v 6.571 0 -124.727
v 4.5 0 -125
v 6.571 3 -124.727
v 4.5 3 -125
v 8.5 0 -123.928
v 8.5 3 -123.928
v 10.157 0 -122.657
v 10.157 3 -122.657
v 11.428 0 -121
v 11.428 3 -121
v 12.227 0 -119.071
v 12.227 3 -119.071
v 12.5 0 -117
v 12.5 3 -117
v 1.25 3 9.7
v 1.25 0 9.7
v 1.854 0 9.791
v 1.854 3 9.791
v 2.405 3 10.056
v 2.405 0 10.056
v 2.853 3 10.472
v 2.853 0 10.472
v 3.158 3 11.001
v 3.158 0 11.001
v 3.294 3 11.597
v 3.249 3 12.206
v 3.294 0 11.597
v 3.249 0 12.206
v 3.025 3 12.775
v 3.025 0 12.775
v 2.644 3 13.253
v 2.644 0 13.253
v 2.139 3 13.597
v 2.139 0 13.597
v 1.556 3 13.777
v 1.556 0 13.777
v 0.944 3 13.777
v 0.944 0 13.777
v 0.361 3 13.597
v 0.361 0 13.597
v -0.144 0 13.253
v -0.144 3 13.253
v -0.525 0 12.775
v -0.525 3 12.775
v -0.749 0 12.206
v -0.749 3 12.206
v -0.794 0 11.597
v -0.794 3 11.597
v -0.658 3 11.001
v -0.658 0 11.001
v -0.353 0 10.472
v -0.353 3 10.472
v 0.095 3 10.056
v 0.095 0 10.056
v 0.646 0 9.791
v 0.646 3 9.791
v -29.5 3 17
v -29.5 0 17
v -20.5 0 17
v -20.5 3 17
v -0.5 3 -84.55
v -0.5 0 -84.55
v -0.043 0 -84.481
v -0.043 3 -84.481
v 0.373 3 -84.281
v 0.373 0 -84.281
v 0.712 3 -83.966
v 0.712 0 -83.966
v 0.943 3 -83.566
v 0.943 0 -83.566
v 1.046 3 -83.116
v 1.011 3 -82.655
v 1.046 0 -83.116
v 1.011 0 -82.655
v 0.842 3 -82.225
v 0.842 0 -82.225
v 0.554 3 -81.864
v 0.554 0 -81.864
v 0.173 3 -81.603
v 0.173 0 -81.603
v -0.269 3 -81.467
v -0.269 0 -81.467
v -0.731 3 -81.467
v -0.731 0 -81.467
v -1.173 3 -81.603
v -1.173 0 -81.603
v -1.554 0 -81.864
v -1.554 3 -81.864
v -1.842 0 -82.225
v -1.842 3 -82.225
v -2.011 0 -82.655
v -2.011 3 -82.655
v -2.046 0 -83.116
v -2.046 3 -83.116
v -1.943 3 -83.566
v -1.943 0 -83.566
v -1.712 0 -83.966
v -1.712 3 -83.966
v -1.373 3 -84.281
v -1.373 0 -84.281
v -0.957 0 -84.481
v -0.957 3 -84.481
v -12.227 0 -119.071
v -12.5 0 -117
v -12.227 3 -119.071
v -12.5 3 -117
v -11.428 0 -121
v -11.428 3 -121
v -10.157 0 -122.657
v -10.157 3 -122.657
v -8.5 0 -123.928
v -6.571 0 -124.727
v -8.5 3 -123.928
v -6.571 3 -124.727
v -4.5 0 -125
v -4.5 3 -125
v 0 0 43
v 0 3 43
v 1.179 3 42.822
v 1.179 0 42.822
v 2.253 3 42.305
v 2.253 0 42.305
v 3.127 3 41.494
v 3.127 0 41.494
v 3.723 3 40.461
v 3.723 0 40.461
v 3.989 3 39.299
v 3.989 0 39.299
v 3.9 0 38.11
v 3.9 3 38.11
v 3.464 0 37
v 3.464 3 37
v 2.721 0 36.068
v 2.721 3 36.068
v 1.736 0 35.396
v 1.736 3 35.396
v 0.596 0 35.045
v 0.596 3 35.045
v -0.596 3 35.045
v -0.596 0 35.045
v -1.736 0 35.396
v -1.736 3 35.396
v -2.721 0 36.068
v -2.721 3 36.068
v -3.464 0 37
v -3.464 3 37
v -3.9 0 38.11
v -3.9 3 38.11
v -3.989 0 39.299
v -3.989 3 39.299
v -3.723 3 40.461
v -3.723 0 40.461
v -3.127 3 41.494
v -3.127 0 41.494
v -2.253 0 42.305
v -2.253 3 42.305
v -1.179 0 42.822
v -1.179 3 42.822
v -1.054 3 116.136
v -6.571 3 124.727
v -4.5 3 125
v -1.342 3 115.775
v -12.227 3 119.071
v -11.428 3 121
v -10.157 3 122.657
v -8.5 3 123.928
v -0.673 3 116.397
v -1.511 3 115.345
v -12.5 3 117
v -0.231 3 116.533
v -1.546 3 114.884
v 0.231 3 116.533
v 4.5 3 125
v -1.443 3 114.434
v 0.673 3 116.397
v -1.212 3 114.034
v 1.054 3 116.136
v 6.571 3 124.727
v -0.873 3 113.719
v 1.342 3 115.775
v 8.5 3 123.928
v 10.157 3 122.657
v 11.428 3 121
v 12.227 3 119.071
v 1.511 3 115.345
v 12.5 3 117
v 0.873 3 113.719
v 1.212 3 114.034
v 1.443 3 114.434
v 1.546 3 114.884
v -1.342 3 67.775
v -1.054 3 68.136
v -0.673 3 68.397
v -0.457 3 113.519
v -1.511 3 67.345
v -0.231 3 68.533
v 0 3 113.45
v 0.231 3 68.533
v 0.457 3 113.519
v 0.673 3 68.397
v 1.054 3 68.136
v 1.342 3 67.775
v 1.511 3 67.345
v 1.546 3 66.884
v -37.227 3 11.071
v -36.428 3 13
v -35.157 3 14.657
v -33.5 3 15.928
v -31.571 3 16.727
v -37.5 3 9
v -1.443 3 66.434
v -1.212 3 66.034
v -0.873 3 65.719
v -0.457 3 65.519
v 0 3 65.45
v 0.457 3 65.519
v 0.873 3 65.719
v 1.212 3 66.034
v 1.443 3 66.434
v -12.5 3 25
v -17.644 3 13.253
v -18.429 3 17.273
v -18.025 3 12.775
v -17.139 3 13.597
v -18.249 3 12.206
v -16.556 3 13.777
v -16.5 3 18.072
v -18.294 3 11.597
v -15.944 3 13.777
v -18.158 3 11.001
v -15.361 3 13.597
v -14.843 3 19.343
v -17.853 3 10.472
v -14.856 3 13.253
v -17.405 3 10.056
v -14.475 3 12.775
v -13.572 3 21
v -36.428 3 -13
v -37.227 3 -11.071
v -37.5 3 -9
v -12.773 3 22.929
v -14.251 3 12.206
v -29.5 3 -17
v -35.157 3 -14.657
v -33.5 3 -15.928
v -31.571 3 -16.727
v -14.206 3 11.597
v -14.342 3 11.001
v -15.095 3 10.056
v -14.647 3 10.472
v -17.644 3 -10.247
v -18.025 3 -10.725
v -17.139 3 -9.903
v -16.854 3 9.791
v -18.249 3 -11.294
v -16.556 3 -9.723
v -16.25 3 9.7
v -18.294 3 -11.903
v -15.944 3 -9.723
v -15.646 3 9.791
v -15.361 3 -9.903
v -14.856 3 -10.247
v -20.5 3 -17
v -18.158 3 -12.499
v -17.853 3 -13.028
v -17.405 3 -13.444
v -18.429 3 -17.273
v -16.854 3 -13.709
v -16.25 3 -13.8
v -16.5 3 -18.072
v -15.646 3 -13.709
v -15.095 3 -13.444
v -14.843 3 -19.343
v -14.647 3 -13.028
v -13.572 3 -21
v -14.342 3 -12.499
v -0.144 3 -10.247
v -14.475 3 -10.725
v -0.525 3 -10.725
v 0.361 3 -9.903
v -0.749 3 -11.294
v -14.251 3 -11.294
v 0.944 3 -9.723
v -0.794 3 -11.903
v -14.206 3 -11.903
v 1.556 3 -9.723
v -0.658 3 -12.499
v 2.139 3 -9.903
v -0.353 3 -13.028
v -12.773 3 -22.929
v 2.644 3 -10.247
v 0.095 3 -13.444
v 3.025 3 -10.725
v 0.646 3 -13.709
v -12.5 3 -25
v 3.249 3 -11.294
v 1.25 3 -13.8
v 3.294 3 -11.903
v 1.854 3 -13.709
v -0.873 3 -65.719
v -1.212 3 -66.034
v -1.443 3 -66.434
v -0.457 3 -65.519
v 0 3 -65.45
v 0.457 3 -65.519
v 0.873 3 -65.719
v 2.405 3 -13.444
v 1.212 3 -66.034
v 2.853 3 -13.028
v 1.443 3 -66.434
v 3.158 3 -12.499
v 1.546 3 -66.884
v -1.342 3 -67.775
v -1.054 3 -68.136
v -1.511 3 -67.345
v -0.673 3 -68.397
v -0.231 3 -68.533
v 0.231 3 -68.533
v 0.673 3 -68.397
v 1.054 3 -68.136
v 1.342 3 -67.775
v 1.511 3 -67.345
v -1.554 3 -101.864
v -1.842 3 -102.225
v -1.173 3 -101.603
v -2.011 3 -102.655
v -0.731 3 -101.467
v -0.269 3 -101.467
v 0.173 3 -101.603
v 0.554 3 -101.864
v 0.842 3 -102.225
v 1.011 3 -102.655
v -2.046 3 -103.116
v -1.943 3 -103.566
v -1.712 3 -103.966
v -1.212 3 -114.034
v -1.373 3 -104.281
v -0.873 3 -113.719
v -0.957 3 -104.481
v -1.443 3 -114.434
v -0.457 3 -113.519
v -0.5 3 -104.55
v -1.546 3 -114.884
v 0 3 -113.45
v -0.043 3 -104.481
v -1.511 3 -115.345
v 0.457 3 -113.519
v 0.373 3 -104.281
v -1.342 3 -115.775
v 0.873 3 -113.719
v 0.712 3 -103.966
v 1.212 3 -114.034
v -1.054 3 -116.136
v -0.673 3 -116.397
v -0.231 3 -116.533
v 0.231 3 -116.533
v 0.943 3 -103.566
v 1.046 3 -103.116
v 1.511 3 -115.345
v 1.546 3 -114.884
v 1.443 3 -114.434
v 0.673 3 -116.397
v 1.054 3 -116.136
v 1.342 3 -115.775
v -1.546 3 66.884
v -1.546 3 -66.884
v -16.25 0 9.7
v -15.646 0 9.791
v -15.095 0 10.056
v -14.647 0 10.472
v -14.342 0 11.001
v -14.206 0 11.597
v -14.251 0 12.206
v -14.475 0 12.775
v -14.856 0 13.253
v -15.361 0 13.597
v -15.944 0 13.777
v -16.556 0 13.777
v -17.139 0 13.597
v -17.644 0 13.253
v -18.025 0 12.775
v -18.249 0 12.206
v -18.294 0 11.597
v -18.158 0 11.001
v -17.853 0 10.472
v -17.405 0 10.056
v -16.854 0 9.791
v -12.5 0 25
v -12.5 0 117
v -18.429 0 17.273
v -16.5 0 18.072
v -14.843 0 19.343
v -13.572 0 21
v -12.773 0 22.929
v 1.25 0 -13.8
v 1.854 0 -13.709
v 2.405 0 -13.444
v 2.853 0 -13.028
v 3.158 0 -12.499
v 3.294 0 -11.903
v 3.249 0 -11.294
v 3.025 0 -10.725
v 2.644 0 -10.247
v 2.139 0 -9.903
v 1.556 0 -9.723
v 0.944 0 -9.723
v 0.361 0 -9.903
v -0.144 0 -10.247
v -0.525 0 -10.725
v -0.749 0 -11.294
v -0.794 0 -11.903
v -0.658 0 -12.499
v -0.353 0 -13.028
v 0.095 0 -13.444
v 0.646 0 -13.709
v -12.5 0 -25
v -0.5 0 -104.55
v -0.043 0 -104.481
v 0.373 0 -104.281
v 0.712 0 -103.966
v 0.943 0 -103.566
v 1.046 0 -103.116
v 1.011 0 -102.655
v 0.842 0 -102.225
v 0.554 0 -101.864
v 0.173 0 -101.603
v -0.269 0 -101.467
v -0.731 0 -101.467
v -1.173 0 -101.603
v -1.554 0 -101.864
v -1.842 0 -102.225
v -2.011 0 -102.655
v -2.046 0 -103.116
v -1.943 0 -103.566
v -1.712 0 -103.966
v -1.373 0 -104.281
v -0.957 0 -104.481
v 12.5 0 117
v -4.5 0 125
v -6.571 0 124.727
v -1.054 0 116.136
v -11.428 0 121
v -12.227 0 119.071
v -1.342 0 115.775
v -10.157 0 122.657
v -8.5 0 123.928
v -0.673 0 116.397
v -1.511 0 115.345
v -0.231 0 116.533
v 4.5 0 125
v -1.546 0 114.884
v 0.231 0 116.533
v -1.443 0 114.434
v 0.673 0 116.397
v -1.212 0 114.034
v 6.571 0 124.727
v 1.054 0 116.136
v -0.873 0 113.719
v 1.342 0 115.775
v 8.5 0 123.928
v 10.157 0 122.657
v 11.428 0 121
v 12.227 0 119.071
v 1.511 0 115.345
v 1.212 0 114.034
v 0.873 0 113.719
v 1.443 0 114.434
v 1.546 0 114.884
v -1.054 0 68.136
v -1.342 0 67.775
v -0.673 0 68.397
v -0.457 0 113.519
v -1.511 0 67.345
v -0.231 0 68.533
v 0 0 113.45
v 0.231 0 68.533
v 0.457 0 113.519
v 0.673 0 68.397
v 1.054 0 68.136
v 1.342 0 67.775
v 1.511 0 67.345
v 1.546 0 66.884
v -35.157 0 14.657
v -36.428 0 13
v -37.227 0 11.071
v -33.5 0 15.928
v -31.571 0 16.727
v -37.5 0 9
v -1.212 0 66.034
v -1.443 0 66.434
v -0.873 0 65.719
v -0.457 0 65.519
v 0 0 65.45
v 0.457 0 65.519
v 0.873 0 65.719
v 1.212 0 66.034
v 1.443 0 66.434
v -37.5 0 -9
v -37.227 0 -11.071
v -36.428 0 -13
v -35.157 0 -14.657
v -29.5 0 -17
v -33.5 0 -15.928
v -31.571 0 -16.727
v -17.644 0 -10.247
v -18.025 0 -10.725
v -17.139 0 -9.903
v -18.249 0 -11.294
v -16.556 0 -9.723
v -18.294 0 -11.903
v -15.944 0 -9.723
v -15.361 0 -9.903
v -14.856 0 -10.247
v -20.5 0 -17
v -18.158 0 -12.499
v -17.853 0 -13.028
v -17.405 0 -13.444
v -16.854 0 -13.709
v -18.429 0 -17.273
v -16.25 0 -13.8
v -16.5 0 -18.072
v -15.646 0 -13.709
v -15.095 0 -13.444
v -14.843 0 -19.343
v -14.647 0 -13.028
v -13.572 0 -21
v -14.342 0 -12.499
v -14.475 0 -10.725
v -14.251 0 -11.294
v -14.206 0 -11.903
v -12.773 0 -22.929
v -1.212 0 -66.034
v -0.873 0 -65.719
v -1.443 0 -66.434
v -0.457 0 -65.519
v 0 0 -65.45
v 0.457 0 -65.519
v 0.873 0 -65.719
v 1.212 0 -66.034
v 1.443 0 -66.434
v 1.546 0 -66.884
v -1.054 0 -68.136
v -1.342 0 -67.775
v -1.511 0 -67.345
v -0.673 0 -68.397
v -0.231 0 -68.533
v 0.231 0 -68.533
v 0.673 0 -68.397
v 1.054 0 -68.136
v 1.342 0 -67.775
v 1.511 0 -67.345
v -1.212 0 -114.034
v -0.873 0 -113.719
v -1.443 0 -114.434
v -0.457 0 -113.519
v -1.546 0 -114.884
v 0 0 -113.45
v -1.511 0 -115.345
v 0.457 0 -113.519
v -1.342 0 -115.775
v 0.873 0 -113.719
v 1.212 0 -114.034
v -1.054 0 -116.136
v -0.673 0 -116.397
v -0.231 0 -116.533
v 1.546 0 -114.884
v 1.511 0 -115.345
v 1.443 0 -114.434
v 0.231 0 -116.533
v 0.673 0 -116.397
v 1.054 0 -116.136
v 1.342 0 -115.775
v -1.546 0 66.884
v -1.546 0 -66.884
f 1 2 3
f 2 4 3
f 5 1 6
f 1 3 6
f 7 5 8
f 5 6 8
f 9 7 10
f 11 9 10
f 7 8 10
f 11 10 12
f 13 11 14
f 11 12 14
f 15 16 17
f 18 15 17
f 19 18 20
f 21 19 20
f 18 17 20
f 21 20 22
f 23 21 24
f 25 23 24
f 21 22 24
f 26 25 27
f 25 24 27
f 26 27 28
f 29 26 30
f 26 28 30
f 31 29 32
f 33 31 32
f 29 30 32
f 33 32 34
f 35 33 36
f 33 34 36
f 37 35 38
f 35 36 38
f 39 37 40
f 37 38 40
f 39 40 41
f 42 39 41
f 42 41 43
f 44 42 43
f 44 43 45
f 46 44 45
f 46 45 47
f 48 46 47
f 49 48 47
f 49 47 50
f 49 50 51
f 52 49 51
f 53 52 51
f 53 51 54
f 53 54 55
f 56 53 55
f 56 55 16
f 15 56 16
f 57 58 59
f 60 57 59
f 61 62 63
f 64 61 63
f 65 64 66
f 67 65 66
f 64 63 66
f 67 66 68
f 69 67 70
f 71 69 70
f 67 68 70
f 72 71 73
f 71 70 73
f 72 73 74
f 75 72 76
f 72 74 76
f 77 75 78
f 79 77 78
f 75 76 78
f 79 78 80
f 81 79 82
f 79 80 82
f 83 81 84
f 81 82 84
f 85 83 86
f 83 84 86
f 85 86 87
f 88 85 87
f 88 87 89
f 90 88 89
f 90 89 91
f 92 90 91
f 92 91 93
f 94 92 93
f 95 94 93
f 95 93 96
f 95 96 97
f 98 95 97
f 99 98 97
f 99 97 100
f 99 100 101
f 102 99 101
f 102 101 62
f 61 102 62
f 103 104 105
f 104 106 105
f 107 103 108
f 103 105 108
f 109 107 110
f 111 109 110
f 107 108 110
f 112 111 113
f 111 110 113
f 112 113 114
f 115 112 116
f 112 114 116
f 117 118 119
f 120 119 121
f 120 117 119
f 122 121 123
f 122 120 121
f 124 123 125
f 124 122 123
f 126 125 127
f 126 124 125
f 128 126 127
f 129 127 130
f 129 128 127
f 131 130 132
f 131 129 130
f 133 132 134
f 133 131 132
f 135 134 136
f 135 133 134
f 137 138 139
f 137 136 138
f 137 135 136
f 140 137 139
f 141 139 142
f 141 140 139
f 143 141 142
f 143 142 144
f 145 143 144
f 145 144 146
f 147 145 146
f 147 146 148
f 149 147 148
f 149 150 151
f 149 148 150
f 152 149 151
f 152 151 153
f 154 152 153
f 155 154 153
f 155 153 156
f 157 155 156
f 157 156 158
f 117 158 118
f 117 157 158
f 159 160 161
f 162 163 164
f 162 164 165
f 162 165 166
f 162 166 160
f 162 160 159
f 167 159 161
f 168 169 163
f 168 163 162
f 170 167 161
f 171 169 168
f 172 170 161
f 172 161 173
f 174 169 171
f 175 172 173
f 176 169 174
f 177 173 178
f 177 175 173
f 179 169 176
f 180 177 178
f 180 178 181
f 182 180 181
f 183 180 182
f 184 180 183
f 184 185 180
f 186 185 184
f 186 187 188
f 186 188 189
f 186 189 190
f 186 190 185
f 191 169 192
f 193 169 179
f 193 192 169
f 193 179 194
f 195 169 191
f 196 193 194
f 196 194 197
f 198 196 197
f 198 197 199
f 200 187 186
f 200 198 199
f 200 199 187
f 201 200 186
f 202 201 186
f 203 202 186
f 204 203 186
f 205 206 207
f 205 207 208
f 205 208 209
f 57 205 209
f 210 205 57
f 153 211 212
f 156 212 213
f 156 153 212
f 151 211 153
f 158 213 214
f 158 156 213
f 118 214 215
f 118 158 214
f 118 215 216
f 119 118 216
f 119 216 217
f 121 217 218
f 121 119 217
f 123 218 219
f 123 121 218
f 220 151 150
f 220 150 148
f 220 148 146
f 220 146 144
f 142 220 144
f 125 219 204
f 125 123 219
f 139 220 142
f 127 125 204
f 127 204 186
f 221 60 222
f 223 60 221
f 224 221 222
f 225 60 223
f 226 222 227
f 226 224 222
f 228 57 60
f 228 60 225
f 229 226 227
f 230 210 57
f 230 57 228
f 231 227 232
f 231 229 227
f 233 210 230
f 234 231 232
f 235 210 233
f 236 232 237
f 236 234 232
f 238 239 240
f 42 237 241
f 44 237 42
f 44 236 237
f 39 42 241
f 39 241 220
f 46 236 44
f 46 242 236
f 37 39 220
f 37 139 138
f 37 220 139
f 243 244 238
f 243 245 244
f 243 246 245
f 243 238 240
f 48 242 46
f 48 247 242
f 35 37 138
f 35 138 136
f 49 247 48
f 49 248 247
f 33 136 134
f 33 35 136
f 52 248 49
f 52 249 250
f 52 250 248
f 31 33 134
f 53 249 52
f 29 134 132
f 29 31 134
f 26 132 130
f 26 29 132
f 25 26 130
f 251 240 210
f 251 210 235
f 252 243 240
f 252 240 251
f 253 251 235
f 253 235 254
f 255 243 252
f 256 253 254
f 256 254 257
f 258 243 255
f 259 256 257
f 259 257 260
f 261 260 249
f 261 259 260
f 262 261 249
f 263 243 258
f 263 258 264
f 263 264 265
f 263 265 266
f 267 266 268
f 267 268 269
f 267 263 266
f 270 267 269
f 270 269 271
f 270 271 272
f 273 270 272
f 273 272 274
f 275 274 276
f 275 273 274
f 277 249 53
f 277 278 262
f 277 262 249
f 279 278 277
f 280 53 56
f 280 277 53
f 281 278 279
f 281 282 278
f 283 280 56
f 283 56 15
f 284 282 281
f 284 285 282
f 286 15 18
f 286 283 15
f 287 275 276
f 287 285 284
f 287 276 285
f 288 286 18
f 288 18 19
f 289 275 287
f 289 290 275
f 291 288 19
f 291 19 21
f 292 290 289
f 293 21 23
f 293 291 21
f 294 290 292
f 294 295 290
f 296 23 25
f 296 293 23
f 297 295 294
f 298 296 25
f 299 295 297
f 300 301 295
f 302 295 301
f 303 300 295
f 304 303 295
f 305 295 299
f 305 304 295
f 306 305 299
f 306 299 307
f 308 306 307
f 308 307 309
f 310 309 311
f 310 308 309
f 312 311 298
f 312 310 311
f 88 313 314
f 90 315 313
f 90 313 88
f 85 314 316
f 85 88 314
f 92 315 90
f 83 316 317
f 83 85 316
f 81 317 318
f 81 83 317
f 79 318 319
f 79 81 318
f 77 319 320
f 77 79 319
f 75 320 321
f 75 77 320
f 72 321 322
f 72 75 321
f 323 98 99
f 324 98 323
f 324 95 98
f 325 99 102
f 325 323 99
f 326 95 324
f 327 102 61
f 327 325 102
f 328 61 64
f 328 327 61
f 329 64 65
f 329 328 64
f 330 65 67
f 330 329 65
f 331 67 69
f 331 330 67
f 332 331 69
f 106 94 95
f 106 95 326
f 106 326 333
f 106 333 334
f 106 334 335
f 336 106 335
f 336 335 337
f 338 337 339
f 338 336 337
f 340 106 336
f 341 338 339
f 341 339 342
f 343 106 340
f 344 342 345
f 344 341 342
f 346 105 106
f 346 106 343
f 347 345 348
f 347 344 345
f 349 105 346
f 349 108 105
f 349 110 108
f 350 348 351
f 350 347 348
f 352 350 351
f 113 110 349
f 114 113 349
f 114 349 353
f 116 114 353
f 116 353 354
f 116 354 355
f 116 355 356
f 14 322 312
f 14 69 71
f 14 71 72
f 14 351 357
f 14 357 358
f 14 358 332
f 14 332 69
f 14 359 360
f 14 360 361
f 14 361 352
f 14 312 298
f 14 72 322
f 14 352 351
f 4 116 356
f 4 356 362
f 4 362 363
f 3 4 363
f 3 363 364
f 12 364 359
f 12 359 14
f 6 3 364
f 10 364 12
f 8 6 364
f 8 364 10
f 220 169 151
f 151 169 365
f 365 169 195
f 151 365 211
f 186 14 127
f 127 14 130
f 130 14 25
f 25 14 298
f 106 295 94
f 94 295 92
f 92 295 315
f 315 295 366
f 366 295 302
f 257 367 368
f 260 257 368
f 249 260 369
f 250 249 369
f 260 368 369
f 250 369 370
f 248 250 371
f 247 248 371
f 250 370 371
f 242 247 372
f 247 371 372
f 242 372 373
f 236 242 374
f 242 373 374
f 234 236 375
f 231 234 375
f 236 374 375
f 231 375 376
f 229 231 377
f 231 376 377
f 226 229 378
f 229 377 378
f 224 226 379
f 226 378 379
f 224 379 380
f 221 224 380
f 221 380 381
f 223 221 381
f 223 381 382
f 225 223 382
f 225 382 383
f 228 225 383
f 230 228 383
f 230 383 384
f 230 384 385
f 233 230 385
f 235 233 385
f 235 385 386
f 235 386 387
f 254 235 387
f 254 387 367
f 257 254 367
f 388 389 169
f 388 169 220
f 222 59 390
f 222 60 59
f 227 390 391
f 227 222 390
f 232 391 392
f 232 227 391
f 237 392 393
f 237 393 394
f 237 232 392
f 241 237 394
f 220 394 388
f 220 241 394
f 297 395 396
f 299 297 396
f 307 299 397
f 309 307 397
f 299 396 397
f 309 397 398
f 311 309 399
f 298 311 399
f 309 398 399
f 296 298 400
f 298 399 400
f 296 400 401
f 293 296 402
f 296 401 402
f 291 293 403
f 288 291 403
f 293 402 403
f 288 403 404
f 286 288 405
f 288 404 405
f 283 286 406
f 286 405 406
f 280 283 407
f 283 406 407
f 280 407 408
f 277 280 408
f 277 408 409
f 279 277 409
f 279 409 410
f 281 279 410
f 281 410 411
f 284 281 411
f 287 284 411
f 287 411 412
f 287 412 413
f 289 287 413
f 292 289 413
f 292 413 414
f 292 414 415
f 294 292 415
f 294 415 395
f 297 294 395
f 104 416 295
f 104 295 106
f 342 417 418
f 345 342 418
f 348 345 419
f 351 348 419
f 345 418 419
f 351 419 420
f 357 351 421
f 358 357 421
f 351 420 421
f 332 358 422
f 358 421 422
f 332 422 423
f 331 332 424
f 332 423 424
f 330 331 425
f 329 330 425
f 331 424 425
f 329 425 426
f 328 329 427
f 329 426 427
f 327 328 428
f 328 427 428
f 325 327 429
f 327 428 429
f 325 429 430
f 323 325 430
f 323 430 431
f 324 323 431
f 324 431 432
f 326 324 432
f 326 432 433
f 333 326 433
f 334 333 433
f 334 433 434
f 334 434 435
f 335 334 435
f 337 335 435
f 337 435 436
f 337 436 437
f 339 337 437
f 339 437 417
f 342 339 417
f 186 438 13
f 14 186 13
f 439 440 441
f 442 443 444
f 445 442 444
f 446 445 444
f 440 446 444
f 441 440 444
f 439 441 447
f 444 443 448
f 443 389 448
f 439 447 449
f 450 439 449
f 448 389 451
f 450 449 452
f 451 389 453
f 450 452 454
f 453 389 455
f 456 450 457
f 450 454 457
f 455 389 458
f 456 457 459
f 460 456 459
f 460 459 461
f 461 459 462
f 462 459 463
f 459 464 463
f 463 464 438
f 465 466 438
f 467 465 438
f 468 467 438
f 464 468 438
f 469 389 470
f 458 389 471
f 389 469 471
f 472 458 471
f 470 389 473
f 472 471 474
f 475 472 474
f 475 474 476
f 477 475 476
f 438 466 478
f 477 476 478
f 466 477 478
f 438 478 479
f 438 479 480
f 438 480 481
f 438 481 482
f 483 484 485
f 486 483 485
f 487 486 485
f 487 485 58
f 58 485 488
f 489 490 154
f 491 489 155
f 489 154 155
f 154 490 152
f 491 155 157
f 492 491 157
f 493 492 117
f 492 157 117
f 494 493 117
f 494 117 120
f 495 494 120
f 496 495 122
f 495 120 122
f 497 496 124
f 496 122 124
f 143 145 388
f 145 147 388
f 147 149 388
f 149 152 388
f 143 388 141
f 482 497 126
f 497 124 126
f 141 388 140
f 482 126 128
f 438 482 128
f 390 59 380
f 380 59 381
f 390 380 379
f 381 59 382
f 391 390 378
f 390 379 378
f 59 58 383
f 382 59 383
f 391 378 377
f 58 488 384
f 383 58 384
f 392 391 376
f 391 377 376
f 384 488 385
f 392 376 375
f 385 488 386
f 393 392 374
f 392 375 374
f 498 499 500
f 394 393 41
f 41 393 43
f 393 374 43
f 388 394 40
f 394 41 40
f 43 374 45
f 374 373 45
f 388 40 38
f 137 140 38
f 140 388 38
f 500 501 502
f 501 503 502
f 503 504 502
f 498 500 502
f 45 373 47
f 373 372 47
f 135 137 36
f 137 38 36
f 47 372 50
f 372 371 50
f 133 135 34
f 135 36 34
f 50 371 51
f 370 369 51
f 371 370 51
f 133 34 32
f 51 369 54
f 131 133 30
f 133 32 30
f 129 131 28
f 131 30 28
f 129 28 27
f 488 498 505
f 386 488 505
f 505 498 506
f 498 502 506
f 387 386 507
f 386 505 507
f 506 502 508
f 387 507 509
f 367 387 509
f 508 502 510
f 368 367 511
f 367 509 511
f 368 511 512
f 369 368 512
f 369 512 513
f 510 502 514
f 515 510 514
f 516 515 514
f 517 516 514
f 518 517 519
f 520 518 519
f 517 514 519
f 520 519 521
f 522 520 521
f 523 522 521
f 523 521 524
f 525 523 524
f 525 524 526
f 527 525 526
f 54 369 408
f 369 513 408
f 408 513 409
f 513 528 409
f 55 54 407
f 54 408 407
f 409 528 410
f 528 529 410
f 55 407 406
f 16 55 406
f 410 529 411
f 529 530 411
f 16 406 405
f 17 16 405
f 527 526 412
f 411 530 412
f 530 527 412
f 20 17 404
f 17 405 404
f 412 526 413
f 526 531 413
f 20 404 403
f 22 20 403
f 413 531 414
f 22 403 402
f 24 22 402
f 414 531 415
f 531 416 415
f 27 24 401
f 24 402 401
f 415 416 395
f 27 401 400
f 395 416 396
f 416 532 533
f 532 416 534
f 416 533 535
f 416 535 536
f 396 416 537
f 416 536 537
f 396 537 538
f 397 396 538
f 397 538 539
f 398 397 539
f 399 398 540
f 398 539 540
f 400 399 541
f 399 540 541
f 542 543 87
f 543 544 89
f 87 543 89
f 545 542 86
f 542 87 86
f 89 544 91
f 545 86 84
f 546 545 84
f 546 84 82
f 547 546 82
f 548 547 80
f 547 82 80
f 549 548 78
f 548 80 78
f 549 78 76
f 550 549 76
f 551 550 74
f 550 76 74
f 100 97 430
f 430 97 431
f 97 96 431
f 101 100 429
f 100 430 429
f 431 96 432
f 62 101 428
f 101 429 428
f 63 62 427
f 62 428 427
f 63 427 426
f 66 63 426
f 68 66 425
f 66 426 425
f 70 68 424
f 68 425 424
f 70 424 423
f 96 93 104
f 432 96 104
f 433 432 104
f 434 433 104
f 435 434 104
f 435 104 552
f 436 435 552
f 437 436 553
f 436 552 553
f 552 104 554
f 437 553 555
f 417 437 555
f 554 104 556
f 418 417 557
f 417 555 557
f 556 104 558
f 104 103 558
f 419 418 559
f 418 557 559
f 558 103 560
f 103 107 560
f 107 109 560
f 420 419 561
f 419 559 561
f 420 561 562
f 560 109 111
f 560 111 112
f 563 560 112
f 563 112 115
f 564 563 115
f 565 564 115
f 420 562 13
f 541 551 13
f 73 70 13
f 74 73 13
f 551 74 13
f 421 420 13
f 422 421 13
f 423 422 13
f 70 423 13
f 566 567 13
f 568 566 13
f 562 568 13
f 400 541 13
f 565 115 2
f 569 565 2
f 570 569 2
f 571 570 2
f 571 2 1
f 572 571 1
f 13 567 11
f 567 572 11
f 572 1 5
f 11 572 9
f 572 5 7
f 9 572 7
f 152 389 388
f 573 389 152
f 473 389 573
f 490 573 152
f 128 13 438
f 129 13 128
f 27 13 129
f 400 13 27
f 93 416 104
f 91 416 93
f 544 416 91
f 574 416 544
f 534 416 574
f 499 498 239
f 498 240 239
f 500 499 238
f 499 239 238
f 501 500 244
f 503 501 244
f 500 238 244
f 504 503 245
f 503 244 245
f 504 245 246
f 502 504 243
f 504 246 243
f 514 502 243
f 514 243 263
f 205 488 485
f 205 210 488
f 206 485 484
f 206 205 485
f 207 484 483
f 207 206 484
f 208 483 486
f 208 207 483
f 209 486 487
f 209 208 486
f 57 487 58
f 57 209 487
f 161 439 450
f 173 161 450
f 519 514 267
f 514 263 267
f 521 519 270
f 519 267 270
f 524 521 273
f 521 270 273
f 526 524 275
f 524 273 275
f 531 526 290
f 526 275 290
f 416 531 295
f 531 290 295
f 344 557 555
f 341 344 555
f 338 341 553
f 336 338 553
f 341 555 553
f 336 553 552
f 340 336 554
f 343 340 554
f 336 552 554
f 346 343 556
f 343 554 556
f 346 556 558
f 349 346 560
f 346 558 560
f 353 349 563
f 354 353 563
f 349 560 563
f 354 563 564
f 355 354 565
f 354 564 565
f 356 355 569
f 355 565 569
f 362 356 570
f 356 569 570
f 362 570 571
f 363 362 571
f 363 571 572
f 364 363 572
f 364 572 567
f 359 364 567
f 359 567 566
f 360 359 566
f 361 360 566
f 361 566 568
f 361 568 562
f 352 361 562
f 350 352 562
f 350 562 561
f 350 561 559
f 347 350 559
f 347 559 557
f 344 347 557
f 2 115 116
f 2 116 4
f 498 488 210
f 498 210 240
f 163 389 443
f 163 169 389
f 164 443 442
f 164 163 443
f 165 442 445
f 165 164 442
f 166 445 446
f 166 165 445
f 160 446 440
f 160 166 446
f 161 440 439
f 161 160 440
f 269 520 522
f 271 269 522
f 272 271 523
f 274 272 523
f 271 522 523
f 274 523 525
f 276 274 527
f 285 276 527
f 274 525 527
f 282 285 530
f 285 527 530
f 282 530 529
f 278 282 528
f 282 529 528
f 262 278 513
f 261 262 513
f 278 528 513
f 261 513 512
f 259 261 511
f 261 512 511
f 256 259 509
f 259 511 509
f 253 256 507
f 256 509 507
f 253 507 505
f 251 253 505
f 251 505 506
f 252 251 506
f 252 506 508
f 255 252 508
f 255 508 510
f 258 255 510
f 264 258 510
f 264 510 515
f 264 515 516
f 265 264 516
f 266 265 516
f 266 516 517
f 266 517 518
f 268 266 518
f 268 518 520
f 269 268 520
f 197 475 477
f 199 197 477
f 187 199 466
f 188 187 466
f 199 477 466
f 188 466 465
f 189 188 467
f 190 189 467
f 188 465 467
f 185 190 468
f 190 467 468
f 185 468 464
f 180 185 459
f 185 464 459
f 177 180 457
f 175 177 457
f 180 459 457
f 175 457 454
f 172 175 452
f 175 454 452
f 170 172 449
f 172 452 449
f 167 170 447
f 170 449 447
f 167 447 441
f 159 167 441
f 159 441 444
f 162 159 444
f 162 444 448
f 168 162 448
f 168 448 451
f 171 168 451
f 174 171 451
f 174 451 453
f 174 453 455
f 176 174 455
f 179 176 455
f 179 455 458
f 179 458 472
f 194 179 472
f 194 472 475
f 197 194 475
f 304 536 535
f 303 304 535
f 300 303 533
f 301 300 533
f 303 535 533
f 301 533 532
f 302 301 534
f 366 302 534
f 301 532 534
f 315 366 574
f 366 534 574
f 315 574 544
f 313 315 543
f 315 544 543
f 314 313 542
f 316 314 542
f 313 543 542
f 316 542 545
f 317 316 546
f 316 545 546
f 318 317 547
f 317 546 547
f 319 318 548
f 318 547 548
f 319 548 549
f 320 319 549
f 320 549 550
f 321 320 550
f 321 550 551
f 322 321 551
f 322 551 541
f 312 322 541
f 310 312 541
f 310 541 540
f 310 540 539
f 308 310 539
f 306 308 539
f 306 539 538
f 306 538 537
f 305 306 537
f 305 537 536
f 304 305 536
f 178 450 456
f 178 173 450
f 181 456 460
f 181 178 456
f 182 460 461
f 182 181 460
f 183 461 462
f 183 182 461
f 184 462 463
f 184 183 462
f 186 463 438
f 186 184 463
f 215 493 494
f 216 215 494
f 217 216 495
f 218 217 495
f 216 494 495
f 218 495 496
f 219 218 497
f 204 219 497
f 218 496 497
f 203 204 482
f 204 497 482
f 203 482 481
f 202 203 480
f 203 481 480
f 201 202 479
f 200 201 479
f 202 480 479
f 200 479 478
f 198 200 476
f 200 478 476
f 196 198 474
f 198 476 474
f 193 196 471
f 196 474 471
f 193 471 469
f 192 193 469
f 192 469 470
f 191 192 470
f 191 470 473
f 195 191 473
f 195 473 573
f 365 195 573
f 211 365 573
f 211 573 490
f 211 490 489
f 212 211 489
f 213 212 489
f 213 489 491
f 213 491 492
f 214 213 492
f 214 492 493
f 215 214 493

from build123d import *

# Parameters (mm, degrees)
SKETCH_1_W          = 25
SKETCH_1_H          = 34
SKETCH_1_H_2        = 108
EXTRUDE_1_DEPTH     = 3
SKETCH_2_R          = 2.05
SKETCH_2_R_2        = 1.55
CUT_EXTRUDE_1_DEPTH = 10
SKETCH_3_R          = 1.55
CUT_EXTRUDE_2_DEPTH = 10
FILLET_1_R          = 8
SKETCH_4_R          = 4
CUT_EXTRUDE_4_DEPTH = 10


with BuildPart() as part:
    # 草图1 → 凸台-拉伸1 (new body)
    with BuildSketch(Plane(origin=(0, 0, 0), x_dir=(1, 0, 0), z_dir=(0, 1, 0))):
        with Locations((-25, 0)):
            Rectangle(SKETCH_1_W, SKETCH_1_H)
        with Locations((0, 71)):
            Rectangle(SKETCH_1_W, SKETCH_1_H_2)
        Rectangle(SKETCH_1_W, SKETCH_1_H)
        with Locations((0, -71)):
            Rectangle(SKETCH_1_W, SKETCH_1_H_2)
    extrude(amount=EXTRUDE_1_DEPTH)

    # 草图2 → 切除-拉伸1 (cut)
    with BuildSketch(Plane(origin=(0, 0, 0), x_dir=(-1, 0, 0), z_dir=(0, -1, 0))):
        with Locations(Location((-1.25, -11.75, 0), (0, 0, 90))):
            Circle(SKETCH_2_R)
        with Locations(Location((-1.25, 11.75, 0), (0, 0, 90))):
            Circle(SKETCH_2_R)
        with Locations(Location((16.25, 11.75, 0), (0, 0, 90))):
            Circle(SKETCH_2_R)
        with Locations(Location((16.25, -11.75, 0), (0, 0, 90))):
            Circle(SKETCH_2_R)
        with Locations(Location((0, -115, 0), (0, 0, 90))):
            Circle(SKETCH_2_R_2)
        with Locations(Location((0, -67, 0), (0, 0, 90))):
            Circle(SKETCH_2_R_2)
        with Locations(Location((0, 115, 0), (0, 0, 270))):
            Circle(SKETCH_2_R_2)
        with Locations(Location((0, 67, 0), (0, 0, 270))):
            Circle(SKETCH_2_R_2)
    extrude(amount=-CUT_EXTRUDE_1_DEPTH, mode=Mode.SUBTRACT)

    # 草图3 → 切除-拉伸2 (cut)
    with BuildSketch(Plane(origin=(0, 0, 0), x_dir=(-1, 0, 0), z_dir=(0, -1, 0))):
        with Locations(Location((0.5, 83, 0), (0, 0, 90))):
            Circle(SKETCH_3_R)
        with Locations(Location((0.5, 103, 0), (0, 0, 90))):
            Circle(SKETCH_3_R)
    extrude(amount=-CUT_EXTRUDE_2_DEPTH, mode=Mode.SUBTRACT)

    # 圆角1
    fillet_1_edges = [part.edges().sort_by_distance(p)[0] for p in [
        (-37.5, 1.5, -17),
        (-12.5, 1.5, -17),
        (-12.5, 1.5, -125),
        (12.5, 1.5, -125),
        (12.5, 1.5, 125),
        (-12.5, 1.5, 125),
        (-12.5, 1.5, 17),
        (-37.5, 1.5, 17),
    ]]
    fillet(fillet_1_edges, radius=FILLET_1_R)

    # 草图4 → 切除-拉伸4 (cut)
    with BuildSketch(Plane(origin=(0, 0, 0), x_dir=(1, 0, 0), z_dir=(0, 1, 0))):
        with Locations(Location((0, -39, 0), (0, 0, 270))):
            Circle(SKETCH_4_R)
    extrude(amount=CUT_EXTRUDE_4_DEPTH, mode=Mode.SUBTRACT)


solid = part.part
